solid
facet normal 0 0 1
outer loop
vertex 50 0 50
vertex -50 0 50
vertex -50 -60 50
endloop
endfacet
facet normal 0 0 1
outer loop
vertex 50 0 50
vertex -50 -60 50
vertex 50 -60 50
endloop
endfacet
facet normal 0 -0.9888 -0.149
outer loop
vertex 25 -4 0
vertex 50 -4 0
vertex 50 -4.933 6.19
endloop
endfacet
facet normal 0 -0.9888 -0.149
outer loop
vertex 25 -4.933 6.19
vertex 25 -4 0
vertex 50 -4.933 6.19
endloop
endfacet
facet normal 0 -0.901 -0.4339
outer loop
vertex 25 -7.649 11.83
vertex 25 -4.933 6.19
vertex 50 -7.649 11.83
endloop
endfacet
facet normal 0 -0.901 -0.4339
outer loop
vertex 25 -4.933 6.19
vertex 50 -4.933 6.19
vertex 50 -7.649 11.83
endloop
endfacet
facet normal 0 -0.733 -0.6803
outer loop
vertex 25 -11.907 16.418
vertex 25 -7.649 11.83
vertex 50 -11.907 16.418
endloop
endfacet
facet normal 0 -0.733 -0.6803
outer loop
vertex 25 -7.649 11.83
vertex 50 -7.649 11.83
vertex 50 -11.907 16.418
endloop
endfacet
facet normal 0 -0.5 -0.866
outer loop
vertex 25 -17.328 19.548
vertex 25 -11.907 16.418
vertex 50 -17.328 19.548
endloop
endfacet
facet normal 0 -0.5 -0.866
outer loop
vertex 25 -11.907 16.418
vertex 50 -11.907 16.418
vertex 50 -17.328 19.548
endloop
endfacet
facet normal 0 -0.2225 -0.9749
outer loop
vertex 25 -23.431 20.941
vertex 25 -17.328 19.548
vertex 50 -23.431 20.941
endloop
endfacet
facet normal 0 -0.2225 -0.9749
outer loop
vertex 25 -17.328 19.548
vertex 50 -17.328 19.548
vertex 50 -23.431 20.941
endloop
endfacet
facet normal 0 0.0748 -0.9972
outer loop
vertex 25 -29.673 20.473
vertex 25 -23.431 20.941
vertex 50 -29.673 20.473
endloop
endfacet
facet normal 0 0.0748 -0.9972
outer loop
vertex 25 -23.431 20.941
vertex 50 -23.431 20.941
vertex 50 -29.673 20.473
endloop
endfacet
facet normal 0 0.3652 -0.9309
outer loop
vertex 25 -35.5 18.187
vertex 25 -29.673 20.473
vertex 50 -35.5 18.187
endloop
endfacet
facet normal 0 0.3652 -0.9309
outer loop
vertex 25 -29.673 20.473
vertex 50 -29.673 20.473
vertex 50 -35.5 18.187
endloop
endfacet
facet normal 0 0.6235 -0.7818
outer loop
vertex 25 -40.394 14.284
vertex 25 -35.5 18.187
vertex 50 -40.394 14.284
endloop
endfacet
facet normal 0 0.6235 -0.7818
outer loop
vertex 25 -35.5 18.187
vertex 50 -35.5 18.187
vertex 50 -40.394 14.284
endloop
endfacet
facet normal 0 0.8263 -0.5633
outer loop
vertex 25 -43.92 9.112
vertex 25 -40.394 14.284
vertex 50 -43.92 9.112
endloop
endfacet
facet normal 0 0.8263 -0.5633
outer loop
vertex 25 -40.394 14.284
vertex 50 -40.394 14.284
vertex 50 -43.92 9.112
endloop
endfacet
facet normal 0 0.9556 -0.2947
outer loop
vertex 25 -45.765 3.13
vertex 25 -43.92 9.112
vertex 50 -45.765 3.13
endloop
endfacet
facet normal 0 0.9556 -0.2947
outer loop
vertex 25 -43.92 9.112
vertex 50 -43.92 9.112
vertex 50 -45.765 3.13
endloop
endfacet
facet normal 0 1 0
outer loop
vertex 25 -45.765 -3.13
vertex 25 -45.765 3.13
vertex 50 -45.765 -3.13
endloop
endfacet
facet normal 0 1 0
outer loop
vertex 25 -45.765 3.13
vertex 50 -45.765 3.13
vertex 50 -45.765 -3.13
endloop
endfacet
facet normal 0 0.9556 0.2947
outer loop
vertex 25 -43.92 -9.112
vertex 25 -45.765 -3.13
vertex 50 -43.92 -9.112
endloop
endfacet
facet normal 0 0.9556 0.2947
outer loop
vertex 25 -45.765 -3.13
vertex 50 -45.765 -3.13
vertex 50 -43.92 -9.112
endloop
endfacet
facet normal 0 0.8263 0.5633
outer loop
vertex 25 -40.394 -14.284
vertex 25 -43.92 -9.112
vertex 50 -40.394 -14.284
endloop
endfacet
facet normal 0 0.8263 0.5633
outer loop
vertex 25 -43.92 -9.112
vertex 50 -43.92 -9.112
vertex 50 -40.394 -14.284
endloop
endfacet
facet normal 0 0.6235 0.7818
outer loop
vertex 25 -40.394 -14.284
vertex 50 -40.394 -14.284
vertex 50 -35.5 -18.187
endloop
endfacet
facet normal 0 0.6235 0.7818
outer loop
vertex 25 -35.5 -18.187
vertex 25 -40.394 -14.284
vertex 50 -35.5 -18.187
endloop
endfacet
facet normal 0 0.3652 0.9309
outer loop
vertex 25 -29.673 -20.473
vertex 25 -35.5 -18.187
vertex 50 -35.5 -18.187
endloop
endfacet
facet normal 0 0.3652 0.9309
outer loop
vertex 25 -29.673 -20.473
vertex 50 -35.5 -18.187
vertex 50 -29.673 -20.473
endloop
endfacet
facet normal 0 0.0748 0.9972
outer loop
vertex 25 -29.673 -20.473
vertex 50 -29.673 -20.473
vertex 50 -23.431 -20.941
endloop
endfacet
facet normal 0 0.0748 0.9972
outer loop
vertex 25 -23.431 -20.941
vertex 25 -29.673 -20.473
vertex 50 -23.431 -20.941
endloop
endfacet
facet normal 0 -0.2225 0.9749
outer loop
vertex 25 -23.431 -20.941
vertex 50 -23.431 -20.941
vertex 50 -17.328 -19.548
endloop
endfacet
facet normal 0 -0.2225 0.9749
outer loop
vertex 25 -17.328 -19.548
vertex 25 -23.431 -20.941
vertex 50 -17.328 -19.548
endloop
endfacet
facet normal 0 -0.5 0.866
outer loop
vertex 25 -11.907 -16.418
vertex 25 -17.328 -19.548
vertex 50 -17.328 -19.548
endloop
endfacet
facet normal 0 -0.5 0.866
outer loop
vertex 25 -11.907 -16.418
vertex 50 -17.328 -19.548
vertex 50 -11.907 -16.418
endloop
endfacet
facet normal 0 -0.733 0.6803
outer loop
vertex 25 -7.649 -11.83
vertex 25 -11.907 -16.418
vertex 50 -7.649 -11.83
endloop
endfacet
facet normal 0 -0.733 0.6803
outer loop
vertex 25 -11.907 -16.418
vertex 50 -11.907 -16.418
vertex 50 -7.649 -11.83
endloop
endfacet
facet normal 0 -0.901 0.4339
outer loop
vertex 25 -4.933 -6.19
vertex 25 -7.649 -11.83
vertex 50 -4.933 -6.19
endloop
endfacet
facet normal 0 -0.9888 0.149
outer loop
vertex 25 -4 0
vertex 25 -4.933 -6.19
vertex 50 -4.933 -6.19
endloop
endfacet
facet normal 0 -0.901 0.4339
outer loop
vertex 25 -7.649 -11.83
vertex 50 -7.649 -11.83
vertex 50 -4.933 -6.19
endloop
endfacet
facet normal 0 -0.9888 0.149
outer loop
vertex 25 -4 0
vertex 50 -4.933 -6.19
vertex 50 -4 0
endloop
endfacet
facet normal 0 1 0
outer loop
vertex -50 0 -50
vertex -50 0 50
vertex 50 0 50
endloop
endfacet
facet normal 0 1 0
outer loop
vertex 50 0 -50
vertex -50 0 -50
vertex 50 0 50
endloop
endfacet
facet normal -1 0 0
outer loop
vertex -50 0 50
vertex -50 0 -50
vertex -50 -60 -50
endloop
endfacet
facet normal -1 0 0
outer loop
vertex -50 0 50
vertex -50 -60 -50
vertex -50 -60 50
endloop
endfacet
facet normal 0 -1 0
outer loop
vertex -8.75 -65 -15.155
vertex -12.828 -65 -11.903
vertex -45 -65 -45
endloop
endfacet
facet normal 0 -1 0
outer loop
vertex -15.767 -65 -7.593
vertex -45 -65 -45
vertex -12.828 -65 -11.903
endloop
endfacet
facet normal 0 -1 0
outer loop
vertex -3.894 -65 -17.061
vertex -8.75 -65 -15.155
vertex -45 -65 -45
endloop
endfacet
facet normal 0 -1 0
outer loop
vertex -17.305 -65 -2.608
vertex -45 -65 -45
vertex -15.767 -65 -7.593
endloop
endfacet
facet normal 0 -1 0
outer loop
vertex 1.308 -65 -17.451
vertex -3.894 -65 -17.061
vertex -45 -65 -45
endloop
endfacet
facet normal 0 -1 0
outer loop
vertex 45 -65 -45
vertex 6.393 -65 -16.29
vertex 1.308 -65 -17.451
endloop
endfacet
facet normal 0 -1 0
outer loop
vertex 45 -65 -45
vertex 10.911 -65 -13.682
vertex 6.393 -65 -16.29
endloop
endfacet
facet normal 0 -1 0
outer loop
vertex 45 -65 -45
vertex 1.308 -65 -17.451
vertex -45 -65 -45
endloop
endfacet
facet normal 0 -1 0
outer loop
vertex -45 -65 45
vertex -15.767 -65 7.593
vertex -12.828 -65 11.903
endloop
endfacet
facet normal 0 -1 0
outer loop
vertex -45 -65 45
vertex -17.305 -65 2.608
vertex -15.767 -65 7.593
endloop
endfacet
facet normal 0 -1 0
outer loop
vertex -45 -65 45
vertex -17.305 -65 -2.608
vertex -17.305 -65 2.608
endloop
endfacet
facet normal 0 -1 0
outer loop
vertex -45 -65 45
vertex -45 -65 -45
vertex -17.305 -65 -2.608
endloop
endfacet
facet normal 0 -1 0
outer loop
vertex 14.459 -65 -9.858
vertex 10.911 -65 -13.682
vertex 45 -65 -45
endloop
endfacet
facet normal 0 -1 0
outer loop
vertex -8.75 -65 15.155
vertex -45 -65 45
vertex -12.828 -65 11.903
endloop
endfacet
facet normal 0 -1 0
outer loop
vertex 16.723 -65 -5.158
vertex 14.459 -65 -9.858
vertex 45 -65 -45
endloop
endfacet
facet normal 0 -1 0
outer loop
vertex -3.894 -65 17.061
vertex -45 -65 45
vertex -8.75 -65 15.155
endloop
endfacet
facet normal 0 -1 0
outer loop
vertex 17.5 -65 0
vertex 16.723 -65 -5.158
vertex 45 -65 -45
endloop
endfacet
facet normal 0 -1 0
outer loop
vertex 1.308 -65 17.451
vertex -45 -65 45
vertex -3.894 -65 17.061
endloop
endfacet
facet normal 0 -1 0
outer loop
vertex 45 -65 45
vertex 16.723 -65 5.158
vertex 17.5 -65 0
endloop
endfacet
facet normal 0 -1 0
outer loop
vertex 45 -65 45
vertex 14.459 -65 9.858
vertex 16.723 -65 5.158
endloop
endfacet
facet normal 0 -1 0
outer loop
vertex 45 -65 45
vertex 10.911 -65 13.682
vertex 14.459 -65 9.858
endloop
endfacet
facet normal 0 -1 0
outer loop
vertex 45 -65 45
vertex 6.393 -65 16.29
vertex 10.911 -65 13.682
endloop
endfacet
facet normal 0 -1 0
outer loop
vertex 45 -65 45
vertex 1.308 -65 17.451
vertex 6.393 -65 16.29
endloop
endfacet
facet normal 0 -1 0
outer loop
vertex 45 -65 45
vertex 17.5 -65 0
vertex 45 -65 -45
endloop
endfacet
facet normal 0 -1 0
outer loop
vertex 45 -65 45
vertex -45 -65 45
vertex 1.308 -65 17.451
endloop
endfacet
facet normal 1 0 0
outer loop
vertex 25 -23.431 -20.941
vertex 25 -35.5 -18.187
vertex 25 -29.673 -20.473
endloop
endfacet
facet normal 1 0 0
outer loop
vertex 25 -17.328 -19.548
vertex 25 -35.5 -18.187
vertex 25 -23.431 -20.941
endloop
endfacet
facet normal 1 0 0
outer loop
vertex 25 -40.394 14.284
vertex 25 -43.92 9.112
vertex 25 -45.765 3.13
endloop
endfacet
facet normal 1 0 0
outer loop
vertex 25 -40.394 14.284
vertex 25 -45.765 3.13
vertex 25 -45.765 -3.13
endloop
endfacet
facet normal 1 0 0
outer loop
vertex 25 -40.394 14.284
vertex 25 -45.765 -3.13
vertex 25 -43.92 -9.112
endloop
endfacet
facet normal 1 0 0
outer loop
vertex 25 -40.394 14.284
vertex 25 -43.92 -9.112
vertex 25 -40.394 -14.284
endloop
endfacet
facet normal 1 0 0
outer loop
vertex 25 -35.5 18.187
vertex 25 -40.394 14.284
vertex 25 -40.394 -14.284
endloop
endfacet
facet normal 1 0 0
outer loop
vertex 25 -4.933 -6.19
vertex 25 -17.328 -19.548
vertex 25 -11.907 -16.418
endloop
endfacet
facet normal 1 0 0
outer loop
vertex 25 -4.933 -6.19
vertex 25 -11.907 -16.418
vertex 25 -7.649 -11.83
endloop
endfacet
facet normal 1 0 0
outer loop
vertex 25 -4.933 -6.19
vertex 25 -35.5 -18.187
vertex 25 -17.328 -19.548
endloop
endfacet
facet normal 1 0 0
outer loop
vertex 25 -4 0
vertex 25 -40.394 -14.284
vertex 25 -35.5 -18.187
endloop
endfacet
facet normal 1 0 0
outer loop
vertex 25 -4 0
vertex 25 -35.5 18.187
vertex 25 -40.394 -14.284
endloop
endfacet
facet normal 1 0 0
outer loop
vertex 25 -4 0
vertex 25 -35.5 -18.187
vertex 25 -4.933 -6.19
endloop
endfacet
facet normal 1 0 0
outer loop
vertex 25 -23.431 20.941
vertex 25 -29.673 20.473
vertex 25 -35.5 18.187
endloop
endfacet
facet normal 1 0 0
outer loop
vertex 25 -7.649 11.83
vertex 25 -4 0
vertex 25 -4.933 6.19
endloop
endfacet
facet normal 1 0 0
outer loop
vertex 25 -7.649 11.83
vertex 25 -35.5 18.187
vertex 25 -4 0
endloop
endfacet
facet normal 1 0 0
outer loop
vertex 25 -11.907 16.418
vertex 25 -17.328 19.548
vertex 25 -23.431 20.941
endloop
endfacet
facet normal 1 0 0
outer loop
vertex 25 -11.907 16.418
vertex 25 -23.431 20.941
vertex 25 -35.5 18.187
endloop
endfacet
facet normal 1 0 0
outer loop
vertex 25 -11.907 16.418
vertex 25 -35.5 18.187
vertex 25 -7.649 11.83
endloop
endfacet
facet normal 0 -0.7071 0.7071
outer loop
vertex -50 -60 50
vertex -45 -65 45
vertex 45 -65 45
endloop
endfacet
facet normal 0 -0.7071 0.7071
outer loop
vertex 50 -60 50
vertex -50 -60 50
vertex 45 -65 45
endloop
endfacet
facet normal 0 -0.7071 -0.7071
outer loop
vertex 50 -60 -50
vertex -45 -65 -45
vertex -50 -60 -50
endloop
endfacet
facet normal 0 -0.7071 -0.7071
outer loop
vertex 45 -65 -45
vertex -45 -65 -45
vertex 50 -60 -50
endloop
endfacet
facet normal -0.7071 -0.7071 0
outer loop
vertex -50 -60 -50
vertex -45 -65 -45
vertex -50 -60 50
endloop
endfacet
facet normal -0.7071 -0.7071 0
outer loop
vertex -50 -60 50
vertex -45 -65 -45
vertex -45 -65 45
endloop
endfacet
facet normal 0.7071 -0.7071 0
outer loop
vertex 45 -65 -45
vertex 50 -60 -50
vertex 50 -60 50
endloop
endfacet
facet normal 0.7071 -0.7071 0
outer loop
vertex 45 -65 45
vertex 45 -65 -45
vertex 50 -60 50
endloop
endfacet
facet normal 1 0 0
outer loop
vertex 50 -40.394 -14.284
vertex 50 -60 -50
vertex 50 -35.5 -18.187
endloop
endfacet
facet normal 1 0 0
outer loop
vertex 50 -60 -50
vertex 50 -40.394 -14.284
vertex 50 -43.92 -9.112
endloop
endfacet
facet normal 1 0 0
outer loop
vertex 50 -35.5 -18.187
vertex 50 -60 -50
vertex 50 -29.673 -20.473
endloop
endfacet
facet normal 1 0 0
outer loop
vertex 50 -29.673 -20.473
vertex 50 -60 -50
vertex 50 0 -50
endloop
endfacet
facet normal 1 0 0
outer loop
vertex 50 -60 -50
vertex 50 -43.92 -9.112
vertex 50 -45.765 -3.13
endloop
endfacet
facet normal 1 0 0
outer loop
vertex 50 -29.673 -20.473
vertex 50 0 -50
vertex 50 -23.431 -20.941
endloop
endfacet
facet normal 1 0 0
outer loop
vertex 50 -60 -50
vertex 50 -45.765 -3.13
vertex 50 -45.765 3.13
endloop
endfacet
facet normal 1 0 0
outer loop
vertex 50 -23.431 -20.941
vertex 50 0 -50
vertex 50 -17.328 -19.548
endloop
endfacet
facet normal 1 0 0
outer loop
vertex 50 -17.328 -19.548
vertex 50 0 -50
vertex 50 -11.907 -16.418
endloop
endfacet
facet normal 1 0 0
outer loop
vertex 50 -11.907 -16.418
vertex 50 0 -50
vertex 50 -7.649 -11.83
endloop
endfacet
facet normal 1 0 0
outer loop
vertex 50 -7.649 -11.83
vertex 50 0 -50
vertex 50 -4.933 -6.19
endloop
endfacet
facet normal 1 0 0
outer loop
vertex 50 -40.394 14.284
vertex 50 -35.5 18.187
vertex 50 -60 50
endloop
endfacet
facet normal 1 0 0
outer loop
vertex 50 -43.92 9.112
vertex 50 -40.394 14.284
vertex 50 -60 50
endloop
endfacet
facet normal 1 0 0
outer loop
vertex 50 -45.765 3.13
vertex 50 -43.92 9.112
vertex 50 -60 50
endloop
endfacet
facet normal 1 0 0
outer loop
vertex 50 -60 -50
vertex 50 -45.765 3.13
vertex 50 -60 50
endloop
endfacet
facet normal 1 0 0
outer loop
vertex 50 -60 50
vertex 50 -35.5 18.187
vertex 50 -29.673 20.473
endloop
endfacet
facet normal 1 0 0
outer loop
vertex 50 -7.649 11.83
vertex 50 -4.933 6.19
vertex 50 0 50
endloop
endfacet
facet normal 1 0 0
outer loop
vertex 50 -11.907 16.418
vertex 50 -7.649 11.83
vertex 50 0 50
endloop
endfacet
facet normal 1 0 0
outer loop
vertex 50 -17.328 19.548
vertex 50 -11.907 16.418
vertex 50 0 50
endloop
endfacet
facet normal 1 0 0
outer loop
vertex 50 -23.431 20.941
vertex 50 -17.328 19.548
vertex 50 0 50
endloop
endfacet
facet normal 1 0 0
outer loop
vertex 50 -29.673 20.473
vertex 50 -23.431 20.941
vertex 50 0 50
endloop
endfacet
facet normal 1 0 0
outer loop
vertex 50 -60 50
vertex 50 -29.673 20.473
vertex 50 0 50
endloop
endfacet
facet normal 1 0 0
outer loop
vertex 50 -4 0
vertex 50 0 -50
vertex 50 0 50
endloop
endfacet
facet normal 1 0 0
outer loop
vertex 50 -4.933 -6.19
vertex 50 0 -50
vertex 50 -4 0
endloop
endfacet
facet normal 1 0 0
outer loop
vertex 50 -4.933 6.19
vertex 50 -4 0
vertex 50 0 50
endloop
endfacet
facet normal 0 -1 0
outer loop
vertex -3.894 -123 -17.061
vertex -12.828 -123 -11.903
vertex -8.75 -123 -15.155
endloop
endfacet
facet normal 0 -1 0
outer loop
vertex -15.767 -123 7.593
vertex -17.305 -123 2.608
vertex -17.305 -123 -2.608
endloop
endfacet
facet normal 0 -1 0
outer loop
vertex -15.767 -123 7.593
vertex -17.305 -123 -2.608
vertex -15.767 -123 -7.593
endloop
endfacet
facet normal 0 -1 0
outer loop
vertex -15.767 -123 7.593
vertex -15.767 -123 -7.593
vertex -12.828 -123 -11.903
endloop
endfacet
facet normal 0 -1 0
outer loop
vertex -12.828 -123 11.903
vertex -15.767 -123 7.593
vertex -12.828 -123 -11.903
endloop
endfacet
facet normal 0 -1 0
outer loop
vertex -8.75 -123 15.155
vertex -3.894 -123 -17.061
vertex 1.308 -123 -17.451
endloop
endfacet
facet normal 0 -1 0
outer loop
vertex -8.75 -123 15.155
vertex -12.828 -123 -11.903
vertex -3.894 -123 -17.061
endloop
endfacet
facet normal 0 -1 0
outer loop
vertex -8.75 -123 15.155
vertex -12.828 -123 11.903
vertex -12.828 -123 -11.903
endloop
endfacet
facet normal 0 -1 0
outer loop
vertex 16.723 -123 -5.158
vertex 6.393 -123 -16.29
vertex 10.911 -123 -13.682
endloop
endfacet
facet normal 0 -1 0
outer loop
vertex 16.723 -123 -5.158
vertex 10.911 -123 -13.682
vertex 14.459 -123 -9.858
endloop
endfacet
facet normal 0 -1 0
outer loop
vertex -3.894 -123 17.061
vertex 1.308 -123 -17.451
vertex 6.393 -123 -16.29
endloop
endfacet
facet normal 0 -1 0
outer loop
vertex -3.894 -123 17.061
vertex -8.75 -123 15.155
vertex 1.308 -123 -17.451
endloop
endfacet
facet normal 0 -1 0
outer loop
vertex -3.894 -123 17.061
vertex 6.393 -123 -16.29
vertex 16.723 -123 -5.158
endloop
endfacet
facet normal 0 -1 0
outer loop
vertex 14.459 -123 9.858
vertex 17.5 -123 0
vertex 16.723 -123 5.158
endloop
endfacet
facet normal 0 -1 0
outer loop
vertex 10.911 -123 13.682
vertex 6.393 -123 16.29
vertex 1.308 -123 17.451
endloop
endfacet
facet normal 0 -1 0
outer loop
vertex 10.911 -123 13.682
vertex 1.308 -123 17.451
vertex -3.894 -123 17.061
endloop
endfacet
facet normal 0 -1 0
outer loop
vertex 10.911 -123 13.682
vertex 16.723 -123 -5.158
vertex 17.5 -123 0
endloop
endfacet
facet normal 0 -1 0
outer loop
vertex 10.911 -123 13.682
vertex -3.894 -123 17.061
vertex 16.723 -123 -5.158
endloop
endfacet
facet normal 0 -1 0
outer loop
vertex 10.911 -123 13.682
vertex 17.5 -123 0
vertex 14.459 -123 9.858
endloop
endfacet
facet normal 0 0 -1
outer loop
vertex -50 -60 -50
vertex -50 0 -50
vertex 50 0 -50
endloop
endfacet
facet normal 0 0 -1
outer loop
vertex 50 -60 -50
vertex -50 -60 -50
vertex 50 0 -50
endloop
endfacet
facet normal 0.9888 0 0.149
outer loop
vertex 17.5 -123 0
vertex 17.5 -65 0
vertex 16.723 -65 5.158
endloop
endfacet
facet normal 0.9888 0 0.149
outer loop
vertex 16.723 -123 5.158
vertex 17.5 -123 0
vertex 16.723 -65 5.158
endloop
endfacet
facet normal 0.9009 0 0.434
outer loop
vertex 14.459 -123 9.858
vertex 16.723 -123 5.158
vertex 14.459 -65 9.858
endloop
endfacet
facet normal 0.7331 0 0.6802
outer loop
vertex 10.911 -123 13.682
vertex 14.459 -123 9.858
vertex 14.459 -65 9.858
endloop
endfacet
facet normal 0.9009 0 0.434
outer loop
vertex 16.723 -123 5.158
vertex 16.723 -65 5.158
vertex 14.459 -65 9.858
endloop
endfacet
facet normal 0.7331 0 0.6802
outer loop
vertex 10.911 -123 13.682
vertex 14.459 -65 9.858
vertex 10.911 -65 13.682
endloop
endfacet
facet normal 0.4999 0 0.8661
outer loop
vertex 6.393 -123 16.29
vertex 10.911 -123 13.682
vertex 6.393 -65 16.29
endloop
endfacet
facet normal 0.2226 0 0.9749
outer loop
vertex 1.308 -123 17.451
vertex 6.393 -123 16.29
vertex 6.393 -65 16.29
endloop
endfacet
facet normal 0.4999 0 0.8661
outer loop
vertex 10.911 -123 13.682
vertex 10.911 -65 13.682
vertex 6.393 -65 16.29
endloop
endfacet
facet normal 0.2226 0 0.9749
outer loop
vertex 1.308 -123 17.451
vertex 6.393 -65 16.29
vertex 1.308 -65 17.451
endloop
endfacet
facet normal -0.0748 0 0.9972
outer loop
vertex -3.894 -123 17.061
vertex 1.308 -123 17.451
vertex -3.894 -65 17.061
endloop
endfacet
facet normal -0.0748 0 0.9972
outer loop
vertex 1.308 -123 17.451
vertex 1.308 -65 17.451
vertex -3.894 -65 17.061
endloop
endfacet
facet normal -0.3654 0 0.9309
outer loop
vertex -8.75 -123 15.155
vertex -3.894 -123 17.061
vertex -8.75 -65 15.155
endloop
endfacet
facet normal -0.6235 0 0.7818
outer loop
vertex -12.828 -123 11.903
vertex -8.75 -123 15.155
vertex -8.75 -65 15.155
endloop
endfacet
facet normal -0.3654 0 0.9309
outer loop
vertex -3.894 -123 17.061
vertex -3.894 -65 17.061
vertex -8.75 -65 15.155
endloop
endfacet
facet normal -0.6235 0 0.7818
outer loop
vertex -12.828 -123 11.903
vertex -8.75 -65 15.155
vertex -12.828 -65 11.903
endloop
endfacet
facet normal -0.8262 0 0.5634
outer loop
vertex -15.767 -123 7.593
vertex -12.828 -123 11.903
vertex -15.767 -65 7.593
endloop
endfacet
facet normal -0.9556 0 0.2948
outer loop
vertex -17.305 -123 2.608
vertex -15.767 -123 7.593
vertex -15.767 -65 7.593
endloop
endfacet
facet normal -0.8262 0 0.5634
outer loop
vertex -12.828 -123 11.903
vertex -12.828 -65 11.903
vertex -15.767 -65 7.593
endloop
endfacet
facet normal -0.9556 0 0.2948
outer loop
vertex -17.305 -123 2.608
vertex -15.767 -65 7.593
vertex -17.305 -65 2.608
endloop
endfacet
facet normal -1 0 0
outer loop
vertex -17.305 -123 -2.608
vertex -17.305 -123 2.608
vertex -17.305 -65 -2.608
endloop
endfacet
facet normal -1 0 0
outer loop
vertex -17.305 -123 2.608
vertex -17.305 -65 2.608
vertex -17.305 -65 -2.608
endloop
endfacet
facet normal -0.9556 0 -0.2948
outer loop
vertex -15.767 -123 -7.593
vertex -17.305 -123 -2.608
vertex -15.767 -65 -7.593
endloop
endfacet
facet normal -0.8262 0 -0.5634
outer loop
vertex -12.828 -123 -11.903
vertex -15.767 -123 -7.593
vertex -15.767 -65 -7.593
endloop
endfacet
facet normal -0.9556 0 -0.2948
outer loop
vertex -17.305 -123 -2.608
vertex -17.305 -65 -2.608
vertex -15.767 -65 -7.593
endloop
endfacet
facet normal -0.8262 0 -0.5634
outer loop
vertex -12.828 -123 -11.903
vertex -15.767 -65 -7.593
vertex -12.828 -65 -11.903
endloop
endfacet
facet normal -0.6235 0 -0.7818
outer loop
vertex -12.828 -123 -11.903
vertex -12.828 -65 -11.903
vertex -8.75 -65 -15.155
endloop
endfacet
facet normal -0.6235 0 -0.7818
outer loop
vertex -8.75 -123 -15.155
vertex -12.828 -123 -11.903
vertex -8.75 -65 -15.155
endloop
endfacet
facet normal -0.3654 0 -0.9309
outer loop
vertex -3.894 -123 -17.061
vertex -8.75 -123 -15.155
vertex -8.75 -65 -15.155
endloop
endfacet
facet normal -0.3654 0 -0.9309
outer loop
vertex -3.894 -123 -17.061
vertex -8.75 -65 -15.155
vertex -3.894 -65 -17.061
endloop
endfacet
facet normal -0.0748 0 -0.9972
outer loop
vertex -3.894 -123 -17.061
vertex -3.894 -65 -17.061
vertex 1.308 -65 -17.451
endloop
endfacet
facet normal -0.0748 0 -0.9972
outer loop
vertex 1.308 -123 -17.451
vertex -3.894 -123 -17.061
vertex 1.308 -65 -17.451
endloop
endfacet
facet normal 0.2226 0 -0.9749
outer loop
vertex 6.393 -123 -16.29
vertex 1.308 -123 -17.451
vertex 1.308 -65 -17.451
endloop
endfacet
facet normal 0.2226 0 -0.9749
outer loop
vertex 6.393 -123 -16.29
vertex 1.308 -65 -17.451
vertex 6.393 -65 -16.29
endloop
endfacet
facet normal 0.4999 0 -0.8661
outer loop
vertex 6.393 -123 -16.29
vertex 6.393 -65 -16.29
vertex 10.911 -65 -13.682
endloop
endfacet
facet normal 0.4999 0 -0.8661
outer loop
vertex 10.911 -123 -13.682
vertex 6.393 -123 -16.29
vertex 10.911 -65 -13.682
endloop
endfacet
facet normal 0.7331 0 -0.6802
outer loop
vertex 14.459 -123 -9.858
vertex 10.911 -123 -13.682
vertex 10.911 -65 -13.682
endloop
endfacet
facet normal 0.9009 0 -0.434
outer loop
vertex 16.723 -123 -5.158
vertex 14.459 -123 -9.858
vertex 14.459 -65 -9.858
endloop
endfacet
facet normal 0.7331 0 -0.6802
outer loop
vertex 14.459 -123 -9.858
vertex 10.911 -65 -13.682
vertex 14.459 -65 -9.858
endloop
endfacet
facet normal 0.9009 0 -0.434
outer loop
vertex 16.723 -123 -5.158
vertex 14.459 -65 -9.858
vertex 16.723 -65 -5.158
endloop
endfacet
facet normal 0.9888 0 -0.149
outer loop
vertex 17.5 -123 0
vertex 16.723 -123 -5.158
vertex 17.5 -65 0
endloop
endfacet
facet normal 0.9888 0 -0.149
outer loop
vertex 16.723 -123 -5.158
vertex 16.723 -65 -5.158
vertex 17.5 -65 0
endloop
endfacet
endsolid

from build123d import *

# Parameters (mm, degrees)
F0_W     = 100
F0_H     = 100
F1_DEPTH = 65
F2_R     = 17.5
F3_DEPTH = 58
F4_SIZE  = 5
F5_R     = 21
F6_DEPTH = 25


with BuildPart() as f1:
    # F0 (on Front) → F1 (new body)
    with BuildSketch(Plane.XZ):
        Rectangle(F0_W, F0_H)
    extrude(amount=F1_DEPTH)

    # F2 (on face) → F3 (join)
    with BuildSketch(Plane.XZ.offset(65)):
        Circle(F2_R)
    extrude(amount=F3_DEPTH)

    # F4
    f4_edges = [f1.edges().sort_by_distance(p)[0] for p in [
        (50, -65, 0),
        (0, -65, -50),
        (0, -65, 50),
        (-50, -65, 0),
    ]]
    chamfer(f4_edges, length=F4_SIZE)

    # F5 (on face) → F6 (cut)
    with BuildSketch(Plane.YZ.offset(50)):
        with Locations((-25, 0)):
            Circle(F5_R)
    extrude(amount=-F6_DEPTH, mode=Mode.SUBTRACT)


solid = f1.part
